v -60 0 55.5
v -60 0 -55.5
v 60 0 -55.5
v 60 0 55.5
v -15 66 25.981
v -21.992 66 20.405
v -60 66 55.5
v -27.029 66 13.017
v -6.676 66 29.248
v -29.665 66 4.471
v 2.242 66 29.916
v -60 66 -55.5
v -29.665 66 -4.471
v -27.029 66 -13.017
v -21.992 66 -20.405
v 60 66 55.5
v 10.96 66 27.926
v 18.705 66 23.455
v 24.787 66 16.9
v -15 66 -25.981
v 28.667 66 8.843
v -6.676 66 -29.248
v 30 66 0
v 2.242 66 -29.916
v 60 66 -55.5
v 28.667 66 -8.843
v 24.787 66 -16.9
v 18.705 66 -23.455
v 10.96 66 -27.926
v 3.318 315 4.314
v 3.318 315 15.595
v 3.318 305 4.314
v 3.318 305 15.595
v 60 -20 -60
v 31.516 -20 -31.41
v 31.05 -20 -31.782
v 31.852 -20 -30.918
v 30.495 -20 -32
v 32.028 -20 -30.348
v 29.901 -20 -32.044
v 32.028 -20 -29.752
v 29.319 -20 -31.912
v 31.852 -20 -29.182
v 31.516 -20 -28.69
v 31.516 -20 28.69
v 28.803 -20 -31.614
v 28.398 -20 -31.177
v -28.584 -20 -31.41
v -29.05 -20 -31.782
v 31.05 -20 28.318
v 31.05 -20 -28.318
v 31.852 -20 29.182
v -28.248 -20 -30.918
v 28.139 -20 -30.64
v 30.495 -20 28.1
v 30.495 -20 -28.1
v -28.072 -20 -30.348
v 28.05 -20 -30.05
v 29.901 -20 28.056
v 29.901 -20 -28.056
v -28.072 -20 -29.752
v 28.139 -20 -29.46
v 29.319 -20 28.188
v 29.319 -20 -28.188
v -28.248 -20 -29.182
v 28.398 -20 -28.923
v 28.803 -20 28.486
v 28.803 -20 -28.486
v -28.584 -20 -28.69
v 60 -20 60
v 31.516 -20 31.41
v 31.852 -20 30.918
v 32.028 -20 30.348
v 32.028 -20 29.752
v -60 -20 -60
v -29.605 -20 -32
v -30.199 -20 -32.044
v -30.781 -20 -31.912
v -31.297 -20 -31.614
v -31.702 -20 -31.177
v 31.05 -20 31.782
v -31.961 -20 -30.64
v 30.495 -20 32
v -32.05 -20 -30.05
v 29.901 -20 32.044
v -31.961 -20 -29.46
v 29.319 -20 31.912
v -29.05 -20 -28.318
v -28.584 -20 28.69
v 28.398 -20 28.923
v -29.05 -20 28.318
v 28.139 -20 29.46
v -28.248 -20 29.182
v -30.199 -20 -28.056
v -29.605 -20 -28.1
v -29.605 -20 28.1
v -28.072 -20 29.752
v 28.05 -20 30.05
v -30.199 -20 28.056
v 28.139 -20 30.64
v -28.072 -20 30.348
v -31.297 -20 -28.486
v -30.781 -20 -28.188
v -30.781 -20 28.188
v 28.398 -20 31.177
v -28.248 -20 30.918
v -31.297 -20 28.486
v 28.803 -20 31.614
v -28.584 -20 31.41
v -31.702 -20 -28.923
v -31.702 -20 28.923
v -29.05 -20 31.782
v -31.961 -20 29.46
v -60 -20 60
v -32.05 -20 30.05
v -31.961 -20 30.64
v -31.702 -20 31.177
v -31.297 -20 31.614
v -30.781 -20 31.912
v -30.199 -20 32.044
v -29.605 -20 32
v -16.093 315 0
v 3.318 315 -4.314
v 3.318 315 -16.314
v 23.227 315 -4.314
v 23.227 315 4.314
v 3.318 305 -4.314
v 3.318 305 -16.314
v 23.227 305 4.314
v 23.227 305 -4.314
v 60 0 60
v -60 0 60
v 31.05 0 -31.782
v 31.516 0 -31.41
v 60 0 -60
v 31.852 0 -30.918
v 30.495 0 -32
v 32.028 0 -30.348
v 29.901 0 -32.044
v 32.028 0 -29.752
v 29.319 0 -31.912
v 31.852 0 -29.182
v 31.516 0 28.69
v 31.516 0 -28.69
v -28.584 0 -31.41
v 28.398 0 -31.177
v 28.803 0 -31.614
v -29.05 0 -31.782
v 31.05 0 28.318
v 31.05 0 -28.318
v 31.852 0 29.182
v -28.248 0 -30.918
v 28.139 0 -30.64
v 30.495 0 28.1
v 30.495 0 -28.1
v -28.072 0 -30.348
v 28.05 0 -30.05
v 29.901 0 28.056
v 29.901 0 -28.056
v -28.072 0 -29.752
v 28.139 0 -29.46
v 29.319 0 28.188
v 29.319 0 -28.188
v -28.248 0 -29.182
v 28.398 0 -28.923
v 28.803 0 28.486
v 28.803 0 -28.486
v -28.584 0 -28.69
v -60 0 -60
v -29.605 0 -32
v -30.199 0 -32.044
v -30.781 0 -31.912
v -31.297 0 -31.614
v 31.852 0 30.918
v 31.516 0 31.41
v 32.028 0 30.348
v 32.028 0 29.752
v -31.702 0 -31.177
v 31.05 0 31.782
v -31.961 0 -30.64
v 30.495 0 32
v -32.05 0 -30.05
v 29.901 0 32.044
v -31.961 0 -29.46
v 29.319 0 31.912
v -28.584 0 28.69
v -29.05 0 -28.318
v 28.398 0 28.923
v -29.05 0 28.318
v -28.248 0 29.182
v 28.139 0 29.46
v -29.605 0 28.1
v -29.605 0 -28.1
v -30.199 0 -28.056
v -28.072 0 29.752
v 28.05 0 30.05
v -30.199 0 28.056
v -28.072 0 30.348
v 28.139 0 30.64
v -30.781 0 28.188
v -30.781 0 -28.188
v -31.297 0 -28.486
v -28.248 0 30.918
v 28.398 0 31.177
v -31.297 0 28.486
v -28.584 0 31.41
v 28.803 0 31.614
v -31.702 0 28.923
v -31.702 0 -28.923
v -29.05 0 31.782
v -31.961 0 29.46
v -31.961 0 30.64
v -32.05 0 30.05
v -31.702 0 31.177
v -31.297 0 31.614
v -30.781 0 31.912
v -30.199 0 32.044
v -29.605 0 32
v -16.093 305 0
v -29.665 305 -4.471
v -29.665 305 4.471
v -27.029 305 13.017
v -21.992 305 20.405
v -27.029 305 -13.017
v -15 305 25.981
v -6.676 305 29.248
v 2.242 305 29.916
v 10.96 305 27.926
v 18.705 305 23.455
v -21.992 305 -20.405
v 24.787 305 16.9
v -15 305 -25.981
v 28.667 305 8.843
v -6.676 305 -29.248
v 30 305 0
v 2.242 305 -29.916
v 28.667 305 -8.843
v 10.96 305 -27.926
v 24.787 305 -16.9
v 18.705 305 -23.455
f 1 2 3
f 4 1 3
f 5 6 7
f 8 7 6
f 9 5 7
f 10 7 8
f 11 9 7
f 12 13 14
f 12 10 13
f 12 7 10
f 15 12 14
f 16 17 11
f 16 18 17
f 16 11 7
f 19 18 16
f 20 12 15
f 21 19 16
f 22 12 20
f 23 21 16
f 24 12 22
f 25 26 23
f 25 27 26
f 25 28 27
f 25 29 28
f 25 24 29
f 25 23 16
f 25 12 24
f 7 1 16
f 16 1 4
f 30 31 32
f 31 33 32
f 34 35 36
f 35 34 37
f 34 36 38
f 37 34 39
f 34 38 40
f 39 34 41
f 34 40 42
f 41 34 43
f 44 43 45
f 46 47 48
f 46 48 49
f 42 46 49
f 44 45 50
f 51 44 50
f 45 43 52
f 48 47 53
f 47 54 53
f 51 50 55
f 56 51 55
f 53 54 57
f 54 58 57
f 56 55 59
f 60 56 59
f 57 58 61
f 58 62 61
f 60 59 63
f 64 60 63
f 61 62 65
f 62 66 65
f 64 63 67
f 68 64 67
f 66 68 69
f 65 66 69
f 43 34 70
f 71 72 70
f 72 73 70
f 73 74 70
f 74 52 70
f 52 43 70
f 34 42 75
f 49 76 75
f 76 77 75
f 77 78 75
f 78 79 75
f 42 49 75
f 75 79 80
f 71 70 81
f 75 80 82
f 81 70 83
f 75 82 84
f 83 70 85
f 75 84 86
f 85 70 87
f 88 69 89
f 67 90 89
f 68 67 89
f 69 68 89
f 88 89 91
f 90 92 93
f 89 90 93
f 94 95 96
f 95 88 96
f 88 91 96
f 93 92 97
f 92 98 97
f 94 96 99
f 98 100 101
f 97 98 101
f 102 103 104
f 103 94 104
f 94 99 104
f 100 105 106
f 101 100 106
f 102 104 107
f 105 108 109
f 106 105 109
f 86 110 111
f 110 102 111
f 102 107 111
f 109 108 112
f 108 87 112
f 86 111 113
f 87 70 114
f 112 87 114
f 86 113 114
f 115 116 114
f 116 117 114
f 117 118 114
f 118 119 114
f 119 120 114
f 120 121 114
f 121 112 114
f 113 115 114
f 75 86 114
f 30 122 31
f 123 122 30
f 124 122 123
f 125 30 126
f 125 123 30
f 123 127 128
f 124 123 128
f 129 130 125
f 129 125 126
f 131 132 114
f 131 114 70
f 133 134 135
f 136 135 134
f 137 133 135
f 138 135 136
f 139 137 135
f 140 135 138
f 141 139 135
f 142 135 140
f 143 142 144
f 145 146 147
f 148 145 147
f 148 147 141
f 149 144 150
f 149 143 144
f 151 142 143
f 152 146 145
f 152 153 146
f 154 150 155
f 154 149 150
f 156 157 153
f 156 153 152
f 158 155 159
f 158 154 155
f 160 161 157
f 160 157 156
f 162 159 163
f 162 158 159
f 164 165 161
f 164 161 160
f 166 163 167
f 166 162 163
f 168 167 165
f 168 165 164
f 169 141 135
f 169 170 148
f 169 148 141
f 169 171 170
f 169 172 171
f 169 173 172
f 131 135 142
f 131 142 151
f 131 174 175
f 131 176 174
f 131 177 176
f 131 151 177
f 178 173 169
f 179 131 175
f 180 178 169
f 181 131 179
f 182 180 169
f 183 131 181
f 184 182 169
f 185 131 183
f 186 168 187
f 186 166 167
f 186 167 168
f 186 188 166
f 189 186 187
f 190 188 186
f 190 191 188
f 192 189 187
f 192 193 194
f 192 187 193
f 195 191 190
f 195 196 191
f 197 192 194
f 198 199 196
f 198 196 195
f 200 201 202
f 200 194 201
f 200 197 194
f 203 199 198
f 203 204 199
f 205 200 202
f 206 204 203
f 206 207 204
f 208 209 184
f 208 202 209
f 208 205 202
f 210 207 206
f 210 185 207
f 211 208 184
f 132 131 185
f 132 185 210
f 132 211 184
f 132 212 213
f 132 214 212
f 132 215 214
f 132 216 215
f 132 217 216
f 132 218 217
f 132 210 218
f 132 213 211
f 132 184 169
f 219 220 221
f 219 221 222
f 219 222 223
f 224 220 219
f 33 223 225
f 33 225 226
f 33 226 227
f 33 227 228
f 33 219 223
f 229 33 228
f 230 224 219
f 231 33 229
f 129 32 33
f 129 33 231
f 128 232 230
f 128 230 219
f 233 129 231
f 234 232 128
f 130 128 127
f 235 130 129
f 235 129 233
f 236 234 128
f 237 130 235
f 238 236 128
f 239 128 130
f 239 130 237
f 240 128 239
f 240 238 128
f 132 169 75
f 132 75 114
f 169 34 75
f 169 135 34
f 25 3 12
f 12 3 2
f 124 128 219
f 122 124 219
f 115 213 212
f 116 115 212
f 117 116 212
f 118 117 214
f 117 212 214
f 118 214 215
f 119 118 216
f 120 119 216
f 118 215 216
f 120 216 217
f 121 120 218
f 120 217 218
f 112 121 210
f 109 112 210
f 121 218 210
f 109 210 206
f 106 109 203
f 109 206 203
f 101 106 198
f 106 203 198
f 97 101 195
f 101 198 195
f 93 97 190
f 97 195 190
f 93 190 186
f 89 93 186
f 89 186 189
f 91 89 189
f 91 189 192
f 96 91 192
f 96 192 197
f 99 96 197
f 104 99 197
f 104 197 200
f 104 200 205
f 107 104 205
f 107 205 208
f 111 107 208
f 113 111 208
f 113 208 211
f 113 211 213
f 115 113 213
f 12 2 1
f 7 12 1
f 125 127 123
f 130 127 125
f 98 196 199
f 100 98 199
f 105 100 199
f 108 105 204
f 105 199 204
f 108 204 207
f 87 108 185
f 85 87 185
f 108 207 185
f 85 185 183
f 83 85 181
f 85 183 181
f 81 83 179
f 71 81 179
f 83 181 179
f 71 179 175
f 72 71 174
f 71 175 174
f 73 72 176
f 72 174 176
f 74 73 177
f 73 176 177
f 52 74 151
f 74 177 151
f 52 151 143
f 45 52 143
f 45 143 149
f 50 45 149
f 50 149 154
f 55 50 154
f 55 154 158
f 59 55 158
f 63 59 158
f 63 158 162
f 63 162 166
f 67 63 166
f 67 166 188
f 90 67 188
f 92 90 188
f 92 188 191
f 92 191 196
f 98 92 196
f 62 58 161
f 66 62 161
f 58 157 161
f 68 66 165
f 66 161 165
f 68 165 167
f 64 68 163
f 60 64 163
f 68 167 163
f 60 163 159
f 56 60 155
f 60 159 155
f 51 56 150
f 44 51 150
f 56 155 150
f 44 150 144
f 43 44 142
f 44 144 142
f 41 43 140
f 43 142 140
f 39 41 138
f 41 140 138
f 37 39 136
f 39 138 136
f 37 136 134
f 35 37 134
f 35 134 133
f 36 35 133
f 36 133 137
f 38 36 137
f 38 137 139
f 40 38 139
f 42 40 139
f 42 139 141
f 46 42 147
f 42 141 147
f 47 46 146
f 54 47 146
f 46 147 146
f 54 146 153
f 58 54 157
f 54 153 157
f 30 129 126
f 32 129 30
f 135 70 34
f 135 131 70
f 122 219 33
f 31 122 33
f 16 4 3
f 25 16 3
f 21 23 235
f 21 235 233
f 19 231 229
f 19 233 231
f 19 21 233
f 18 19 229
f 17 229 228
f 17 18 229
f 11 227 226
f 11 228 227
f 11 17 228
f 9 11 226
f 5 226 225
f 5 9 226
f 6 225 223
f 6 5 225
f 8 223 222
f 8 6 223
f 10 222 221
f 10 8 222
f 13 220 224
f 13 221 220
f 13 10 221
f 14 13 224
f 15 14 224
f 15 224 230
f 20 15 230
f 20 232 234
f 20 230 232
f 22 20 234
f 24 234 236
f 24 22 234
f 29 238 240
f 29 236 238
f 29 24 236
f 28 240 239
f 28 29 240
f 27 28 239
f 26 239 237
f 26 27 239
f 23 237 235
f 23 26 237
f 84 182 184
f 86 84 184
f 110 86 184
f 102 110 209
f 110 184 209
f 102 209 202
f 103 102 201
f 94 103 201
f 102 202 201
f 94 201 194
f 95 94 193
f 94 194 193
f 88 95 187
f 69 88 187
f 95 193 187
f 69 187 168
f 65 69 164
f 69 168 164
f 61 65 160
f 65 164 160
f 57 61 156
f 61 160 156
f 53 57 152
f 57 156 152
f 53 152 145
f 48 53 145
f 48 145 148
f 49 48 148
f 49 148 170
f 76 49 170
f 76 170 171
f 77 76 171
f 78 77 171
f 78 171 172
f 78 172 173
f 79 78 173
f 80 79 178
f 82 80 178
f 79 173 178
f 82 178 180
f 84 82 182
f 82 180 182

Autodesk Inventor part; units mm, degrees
ref_plane "YZ Plane" through (0, 0, 0) normal (1, 0, 0) x (0, 1, 0)
ref_plane "XZ Plane" through (0, 0, 0) normal (0, 1, 0) x (-1, 0, 0)
ref_plane "XY Plane" through (0, 0, 0) normal (0, 0, 1) x (1, 0, 0)
sketch "Sketch1" plane through (0, 0, 0) normal (0, 1, 0) x (-1, 0, 0)
  line L0 (60, 55.5) -> (-60, 55.5) construction
  line L1 (-60, 55.5) -> (-60, -55.5) construction
  line L2 (-60, -55.5) -> (60, -55.5) construction
  line L3 (60, -55.5) -> (60, 55.5) construction
  line L4 (60, 55.5) -> (-60, -55.5) construction
  line L5 (-60, 55.5) -> (60, -55.5) construction
  line L6 (30.05, 30.05) -> (-30.05, 30.05) construction
  line L7 (-30.05, 30.05) -> (-30.05, -30.05) construction
  line L8 (-30.05, -30.05) -> (30.05, -30.05) construction
  line L9 (30.05, -30.05) -> (30.05, 30.05) construction
  line L10 (30.05, 30.05) -> (-30.05, -30.05) construction
  line L11 (-30.05, 30.05) -> (30.05, -30.05) construction
  circle A0 centre (30.05, 30.05) radius 2
  circle A1 centre (30.05, -30.05) radius 2
  circle A2 centre (-30.05, 30.05) radius 2
  circle A3 centre (-30.05, -30.05) radius 2
  line L12 (60, 60) -> (-60, 60)
  line L13 (-60, 60) -> (-60, -60)
  line L14 (-60, -60) -> (60, -60)
  line L15 (60, -60) -> (60, 60)
  line L16 (60, 60) -> (-60, -60) construction
  line L17 (-60, 60) -> (60, -60) construction
  point P0 (0, 0)
  point P1 (0, 0)
  point P2 (0, 0)
  dimension "d0" = 120
  dimension "d1" = 111
  dimension "d2" = 60.1
  dimension "d3" = 60.1
  dimension "d4" = 4
  dimension "d5" = 4
  dimension "d6" = 4
  dimension "d7" = 4
  dimension "d8" = 120
  dimension "d9" = 120
extrude "Extrusion1" add sketch "Sketch1" against normal blind 20
sketch "Sketch2" plane through (0, 0, 0) normal (0, 1, 0) x (1, 0, 0)
  line L0 (-60, -55.5) -> (60, -55.5)
  line L1 (60, -55.5) -> (60, 55.5)
  line L2 (60, 55.5) -> (-60, 55.5)
  line L3 (-60, 55.5) -> (-60, -55.5)
  line L4 (-60, -55.5) -> (60, 55.5) construction
  line L5 (60, -55.5) -> (-60, 55.5) construction
  point P0 (0, 0)
  dimension "d12" = 120
  dimension "d13" = 111
extrude "Extrusion2" add sketch "Sketch2" along normal blind 66 separate body
sketch "Sketch3" plane through (0, 66, 0) normal (0, 1, 0) x (1, 0, 0)
  circle A0 centre (0, 0) radius 30
  dimension "d16" = 60
extrude "Extrusion3" add sketch "Sketch3" along normal blind 239 bodies 2
sketch "Sketch4" plane through (0, 305, 0) normal (0, 1, 0) x (1, 0, 0)
  line L0 (3.3181, 4.3136) -> (23.2268, 4.3136)
  line L1 (23.2268, 4.3136) -> (23.2268, -4.3136)
  line L2 (23.2268, -4.3136) -> (3.3181, -4.3136)
  line L3 (3.3181, -4.3136) -> (3.3181, 4.3136)
  line L4 (3.3181, 4.3136) -> (23.2268, -4.3136) construction
  line L5 (23.2268, 4.3136) -> (3.3181, -4.3136) construction
  line L6 (3.3181, 4.3136) -> (3.3181, 16.3136)
  line L7 (3.3181, 16.3136) -> (-16.0929, 0)
  line L8 (-16.0929, 0) -> (3.3181, -15.5951)
  line L9 (3.3181, -15.5951) -> (3.3181, -3.5951)
  point P0 (0, 0)
  point P1 (13.2725, 0)
  dimension "d19" = 12
  dimension "d20" = 12
extrude "Extrusion4" add sketch "Sketch4" along normal blind 10 bodies 2
properties part number "f18base"
